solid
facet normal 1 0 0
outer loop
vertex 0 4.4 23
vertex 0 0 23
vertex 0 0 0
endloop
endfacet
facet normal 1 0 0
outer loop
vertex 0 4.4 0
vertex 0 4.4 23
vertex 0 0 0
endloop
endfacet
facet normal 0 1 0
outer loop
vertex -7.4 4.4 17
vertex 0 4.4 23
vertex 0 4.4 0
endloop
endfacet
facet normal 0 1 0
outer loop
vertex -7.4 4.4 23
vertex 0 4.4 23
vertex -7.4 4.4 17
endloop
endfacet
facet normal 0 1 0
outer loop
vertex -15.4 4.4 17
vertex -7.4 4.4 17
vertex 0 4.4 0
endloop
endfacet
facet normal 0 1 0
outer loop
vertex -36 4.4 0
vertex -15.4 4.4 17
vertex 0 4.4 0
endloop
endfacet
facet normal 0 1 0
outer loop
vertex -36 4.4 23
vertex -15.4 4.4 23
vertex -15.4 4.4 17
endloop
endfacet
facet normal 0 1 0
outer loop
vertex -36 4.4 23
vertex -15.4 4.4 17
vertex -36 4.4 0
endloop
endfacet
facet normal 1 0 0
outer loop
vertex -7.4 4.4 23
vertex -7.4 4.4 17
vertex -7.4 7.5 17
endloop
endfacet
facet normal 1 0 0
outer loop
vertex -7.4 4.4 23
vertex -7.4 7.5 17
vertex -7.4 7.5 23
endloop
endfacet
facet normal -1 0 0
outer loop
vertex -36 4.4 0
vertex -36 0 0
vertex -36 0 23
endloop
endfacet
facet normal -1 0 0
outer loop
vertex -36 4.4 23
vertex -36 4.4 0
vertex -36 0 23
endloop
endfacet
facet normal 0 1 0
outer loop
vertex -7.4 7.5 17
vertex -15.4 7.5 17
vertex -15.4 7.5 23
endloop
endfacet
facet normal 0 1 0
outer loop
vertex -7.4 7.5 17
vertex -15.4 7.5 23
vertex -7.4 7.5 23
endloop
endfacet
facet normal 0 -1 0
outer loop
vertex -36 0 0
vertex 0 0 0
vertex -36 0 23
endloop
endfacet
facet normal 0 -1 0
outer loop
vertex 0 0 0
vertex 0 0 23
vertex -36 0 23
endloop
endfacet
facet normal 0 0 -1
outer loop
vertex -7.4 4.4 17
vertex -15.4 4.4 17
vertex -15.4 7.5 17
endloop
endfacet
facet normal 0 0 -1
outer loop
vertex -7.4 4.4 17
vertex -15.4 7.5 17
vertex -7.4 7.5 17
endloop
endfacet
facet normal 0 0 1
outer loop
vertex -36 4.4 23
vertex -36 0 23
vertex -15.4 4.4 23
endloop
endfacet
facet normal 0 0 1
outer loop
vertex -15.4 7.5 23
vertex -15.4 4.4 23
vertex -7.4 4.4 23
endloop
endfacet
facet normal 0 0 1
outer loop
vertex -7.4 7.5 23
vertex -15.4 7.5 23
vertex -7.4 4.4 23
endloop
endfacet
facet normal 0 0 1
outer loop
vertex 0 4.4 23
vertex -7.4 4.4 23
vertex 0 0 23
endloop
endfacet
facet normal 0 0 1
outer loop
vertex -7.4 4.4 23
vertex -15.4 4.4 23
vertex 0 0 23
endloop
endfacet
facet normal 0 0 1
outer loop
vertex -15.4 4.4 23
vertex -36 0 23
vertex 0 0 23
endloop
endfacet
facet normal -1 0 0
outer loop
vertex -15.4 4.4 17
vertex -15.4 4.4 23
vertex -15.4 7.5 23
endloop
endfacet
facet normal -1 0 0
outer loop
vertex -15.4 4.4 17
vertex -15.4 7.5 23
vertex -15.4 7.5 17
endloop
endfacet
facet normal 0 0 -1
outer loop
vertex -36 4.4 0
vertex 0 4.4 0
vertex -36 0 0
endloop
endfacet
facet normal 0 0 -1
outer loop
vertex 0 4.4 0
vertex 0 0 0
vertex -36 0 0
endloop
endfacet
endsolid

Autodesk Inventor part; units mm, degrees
ref_plane "YZ Plane" through (0, 0, 0) normal (1, 0, 0) x (0, 1, 0)
ref_plane "XZ Plane" through (0, 0, 0) normal (0, 1, 0) x (-1, 0, 0)
ref_plane "XY Plane" through (0, 0, 0) normal (0, 0, 1) x (1, 0, 0)
sketch "Sketch1" plane through (0, 0, 0) normal (0, 1, 0) x (-1, 0, 0)
  line L0 (36, 23) -> (0, 23)
  line L1 (0, 23) -> (0, 0)
  line L2 (0, 0) -> (36, 0)
  line L3 (36, 0) -> (36, 23)
  dimension "d0" = 36
  dimension "d1" = 23
extrude "Extrusion1" add sketch "Sketch1" along normal blind 4.4
sketch "Sketch2" plane through (0, 4.4, 0) normal (0, 1, 0) x (1, 0, 0)
  line L0 (-36, -23) -> (0, -23) projected
  line L1 (-15.4, -17) -> (-7.4, -17)
  line L2 (-7.4, -17) -> (-7.4, -23)
  line L3 (-7.4, -23) -> (-15.4, -23)
  line L4 (-15.4, -23) -> (-15.4, -17)
  line L5 (0, -23) -> (0, 0) projected
  dimension "d4" = 8
  dimension "d5" = 6
  dimension "d6" = 7.4
extrude "Extrusion2" add sketch "Sketch2" along normal blind 3.1
properties part number "Power Booster" material "ABS Plastic"
